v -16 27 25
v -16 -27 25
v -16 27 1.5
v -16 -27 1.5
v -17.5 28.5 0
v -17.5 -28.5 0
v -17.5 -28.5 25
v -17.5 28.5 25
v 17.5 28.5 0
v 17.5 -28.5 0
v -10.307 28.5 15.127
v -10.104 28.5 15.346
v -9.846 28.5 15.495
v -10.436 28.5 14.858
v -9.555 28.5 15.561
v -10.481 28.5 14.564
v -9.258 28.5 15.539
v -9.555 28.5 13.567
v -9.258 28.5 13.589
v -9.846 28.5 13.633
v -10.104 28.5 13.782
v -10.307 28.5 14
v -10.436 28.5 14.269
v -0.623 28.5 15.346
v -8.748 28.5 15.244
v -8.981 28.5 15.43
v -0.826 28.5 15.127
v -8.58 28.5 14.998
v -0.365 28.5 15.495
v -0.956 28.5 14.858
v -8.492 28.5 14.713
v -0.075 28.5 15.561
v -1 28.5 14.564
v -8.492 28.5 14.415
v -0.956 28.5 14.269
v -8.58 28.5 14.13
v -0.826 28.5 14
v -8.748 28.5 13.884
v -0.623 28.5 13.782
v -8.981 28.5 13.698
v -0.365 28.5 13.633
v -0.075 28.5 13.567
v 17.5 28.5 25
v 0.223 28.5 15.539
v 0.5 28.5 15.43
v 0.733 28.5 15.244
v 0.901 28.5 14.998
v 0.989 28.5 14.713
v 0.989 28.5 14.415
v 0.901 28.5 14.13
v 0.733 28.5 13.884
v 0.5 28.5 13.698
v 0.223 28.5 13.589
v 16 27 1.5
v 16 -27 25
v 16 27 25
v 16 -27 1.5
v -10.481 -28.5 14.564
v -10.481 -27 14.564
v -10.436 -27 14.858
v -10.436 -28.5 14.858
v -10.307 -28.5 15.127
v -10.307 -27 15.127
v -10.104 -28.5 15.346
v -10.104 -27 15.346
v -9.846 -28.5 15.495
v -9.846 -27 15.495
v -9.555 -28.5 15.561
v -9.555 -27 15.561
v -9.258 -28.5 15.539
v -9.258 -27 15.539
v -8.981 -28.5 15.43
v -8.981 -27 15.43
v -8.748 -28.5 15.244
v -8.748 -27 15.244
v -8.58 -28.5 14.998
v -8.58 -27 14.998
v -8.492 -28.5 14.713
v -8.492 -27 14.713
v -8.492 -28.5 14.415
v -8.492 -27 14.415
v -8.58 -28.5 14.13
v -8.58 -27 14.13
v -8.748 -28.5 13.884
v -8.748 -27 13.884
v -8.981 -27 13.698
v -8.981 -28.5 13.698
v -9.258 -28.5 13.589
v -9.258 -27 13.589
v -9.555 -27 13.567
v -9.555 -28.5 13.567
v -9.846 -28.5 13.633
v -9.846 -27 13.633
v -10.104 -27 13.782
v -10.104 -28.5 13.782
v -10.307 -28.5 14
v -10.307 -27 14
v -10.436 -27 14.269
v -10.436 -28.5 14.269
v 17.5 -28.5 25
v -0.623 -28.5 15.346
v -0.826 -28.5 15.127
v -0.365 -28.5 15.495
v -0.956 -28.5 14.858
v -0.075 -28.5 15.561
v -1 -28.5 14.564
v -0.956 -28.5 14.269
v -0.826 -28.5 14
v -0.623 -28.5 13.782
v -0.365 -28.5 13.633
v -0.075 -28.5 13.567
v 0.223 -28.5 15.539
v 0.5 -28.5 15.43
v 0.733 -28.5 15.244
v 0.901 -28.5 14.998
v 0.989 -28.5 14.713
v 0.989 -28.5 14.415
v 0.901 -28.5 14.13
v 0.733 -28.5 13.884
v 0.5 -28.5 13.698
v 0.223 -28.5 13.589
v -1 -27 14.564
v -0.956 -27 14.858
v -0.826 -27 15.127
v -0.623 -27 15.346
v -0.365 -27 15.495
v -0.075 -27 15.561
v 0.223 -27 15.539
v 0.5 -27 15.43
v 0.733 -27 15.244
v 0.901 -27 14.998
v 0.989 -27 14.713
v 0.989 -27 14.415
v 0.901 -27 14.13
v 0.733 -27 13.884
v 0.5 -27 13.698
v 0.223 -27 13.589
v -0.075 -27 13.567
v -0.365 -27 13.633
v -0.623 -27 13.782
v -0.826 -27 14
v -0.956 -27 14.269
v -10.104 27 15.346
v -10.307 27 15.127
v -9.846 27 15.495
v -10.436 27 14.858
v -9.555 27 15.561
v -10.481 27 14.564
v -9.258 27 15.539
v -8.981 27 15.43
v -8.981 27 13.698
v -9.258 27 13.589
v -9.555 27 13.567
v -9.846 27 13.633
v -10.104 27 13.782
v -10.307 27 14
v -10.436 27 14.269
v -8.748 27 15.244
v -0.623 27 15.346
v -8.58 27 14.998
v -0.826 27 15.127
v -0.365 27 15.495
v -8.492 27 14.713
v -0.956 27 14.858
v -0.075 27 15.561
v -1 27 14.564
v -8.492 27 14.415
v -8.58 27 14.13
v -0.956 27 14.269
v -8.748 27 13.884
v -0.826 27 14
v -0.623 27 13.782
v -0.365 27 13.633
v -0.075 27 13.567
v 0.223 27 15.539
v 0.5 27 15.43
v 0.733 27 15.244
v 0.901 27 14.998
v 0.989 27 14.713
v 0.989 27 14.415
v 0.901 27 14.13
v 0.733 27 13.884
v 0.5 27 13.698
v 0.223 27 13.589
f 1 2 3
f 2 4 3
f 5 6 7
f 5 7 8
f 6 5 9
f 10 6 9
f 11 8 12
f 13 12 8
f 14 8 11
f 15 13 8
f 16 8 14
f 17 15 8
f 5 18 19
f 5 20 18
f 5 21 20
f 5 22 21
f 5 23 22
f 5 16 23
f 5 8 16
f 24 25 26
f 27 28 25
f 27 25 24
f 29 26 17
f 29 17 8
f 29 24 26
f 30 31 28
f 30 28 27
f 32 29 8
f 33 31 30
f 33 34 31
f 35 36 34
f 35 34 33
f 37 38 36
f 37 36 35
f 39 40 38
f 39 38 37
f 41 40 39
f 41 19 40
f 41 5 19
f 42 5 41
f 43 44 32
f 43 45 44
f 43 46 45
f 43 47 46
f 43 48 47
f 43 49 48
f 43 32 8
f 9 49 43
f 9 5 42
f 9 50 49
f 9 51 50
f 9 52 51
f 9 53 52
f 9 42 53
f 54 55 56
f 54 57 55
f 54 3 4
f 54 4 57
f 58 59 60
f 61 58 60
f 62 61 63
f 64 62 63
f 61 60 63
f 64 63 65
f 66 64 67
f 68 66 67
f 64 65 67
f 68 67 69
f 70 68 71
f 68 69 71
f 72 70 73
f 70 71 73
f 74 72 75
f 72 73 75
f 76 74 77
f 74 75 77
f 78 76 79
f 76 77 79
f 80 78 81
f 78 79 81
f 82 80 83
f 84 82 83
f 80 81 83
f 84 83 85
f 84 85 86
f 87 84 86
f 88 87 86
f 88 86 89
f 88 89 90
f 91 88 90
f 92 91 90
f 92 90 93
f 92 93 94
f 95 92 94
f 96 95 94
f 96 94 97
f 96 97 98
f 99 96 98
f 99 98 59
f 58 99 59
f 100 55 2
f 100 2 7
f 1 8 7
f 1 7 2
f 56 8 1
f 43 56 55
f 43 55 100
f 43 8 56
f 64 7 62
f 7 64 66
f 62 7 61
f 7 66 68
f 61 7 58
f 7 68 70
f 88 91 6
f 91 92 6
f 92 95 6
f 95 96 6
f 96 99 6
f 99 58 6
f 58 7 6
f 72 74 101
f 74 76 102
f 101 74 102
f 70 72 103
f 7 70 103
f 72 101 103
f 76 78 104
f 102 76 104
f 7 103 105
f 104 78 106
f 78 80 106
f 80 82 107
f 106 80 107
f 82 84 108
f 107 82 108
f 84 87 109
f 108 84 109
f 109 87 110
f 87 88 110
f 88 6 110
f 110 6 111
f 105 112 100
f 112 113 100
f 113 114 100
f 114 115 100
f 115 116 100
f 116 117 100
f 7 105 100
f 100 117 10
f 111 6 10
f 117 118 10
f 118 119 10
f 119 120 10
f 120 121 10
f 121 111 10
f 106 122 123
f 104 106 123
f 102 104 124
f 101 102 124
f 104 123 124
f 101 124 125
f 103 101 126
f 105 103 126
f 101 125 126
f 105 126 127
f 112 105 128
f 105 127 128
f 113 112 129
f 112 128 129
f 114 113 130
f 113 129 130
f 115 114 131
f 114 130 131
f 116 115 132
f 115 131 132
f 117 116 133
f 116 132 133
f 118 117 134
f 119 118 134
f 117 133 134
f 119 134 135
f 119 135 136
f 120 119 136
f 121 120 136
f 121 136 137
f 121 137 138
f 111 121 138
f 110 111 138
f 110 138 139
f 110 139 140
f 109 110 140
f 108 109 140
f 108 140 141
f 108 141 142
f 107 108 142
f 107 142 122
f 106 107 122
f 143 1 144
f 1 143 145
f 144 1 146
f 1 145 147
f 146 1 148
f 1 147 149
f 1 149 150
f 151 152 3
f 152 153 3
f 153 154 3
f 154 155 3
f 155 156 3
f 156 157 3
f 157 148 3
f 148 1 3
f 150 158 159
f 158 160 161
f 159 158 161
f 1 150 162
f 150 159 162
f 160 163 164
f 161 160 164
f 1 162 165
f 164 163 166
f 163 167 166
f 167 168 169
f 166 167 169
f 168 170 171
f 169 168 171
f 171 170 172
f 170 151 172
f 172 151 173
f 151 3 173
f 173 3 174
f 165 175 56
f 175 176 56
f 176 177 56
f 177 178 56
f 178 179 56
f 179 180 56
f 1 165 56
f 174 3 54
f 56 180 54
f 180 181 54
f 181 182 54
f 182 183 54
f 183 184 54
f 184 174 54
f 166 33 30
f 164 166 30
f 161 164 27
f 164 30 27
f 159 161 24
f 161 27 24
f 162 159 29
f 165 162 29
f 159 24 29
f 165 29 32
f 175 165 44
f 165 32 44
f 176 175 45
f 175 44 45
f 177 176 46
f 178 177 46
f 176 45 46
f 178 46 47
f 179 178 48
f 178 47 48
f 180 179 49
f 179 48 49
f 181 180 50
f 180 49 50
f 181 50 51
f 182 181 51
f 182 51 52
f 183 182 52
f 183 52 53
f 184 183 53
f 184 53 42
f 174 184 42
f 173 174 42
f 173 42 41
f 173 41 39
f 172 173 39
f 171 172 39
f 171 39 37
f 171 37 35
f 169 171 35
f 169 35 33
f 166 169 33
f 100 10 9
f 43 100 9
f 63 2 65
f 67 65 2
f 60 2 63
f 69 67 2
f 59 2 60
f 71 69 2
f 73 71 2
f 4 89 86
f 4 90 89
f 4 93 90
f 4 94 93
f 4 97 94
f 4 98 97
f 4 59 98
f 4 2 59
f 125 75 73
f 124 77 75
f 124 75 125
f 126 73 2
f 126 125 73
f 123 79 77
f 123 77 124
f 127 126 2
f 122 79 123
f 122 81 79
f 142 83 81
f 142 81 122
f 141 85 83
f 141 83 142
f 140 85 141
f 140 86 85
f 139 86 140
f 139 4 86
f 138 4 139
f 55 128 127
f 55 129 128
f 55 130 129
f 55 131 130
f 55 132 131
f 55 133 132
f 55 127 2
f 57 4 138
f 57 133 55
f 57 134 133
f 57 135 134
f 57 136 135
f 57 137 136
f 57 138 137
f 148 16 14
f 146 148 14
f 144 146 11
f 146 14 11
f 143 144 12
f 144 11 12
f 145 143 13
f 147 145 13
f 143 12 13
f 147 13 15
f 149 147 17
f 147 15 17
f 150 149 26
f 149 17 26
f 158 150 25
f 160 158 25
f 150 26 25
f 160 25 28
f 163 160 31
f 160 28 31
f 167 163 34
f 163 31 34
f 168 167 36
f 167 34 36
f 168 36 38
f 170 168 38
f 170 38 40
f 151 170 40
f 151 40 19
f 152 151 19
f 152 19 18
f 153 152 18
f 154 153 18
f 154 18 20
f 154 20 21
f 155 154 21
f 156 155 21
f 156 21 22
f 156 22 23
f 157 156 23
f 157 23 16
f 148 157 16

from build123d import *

# Parameters (mm, degrees)
F0_W     = 35
F0_H     = 57
F1_DEPTH = 25
F2_T     = -1.5
F4_D     = 2


with BuildPart() as f1:
    # F0 (on Top) → F1 (new body)
    with BuildSketch(Plane.XY):
        Rectangle(F0_W, F0_H)
    extrude(amount=F1_DEPTH)

    # F2
    f2_openings = [f1.faces().sort_by_distance(p)[0] for p in [
        (0, 0, 25),
    ]]
    offset(amount=F2_T, openings=f2_openings)

    # F4 (through all)
    with Locations(Plane.XZ.offset(28.5)):
        with Locations((-9.480757, 14.56372), (0, 14.56372)):
            Hole(F4_D / 2)


solid = f1.part
